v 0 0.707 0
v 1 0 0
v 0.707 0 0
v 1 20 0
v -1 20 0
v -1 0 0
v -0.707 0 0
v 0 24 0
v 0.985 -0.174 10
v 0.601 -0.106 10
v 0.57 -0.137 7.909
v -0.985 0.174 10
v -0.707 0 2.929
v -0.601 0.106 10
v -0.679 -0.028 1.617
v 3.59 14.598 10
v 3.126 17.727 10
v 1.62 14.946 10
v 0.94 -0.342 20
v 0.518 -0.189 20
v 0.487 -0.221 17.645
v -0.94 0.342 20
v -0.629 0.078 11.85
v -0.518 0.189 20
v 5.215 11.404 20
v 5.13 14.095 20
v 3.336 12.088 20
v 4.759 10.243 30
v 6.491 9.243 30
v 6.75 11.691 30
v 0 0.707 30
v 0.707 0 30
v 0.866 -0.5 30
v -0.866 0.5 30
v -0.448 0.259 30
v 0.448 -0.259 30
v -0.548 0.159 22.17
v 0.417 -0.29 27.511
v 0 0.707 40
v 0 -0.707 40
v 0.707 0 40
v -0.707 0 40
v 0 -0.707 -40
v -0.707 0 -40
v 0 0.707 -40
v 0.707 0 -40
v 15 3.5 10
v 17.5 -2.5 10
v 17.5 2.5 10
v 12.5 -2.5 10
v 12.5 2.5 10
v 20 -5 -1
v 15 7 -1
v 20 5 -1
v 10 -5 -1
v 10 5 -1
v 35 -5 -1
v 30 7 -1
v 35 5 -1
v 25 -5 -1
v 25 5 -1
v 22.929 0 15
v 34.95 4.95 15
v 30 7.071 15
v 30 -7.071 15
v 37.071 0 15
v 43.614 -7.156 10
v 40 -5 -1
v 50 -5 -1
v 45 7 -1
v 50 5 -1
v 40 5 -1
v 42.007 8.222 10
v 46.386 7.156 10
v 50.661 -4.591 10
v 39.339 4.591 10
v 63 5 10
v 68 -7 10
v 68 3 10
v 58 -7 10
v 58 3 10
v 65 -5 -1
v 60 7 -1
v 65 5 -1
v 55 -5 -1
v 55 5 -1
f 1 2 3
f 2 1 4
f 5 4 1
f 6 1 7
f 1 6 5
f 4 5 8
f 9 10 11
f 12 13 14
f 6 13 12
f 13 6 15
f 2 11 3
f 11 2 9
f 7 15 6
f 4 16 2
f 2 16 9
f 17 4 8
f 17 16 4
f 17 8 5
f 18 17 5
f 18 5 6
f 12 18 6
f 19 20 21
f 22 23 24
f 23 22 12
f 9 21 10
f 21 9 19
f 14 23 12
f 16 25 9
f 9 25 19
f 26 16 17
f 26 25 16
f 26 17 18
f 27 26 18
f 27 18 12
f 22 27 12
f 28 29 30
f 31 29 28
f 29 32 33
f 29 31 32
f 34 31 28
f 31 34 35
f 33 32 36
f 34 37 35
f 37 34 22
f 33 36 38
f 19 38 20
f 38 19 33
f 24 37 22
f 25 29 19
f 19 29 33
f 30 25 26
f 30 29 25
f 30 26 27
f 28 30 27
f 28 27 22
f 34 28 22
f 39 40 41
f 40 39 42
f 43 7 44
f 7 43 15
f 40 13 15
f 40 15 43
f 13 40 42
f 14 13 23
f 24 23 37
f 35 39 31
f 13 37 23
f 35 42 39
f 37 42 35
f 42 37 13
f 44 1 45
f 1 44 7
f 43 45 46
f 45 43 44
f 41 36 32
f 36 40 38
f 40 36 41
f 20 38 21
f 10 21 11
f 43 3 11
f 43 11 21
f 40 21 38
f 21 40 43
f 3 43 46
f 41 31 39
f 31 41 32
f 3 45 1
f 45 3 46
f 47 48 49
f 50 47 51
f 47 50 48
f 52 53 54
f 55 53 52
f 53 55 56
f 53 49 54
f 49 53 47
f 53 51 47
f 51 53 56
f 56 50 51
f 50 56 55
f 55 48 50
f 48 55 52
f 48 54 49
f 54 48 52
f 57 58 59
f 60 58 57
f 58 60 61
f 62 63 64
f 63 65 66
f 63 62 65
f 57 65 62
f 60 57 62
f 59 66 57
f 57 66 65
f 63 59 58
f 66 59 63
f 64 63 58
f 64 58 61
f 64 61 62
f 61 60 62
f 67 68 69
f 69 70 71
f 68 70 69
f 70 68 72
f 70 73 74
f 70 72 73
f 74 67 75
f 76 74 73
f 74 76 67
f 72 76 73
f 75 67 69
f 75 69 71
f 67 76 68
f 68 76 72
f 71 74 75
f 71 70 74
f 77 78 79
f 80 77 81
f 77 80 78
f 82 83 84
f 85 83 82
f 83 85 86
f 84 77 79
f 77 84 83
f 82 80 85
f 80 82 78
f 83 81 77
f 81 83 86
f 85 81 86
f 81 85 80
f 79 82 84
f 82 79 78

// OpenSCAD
//# Copyright (C) 2017 Robert Marchese
//
// An alternative to the standard linear extrusion operation.
//
// A list of 2D coordinates is transformed by the given parametes 
// and moved to the z=h plane. The original and transformed set of 
// points are used to generate a polyhedron.
//
// This program is available under the Creative Commons 
// Attribution-ShareAlike License; additional terms may apply. 
// 
// References:
// https://en.wikipedia.org/wiki/Transformation_matrix#Affine_transformations
// https://en.wikibooks.org/wiki/OpenSCAD_User_Manual/Primitive_Solids#polyhedron
//

// Examples
// Test points form a little house shape centered on [0,0]
points = [[-5,-5],[5,-5],[5,5],[0,7],[-5,5]];


//translate([-15,0,0]) polygon(points);

// height 10, no other transforms
//alt_extrude(points, 10);
stretch (
    points,
    transform_matrix(0, 0, [.2,2],[0,5]),
    transform_matrix(10, -10, [.2,1.5], [0,5]));
stretch (
    points,
    transform_matrix(10, -10, [.2,1.5], [0,5]),
    transform_matrix(20, -20, [.2,1.25], [0,5]));
stretch (
    points,
    transform_matrix(20, -20, [.2,1.25], [0,5]),
    transform_matrix(30, -30, [.2,1.125], [0,5]));
rotate([0,0,45]) translate([0,-0,0]) cube([1,1,80], center=true);

// height 10, top surface scaled to half size
translate([15,0,0]) alt_extrude(points, 10, 0, [.5,.5]);

// height 15, rotated 45 deg counter clockwise
translate([30,0,0]) alt_extrude(points, 15, -45, [1, 1]);

// height 10, rotated 20 deg and scaled 75% in X, 125% in Y
translate([45,0,0]) alt_extrude(points, 10, 20, [.75,1.25]);

// height 10, skewed left x=3 and down 2
translate([60,0,0]) alt_extrude(points, 10, 0, [1,1], [3,-2]);
// Examples
//

// Dot product of two vectors of length 3.
function dot(a, b) = a[0]*b[0]+a[1]*b[1]+a[2]*b[2];

// Generates a transfrom matrix from the given paramers
// h - the Z-axis value the polygon is moved to
// a - rotation angle
// s - scale factors, a vector [Sx, Sy]
// t - translation value, a vector [Tx, amd Ty]
// Returns a 3x3 matrix for the Rotation, Scale and 
// Translation (in that order)
/*
function transform_matrix(h=0, a=0, s=[1,1], t=[0,0]) = 
    [[s[0]*cos(a), -s[1]*sin(a), t[0]],
     [s[0]*sin(a),  s[1]*cos(a), t[1]],
     [          0,            0, h]];
*/
function transform_matrix(h=0, a=0, s=[1,1], t=[0,0]) =
    [[s[0]*cos(a), -s[1]*sin(a), t[0]*s[0]*cos(a)-t[1]*s[1]*sin(a)],
     [s[0]*sin(a),  s[1]*cos(a), t[0]*s[0]*sin(a)+t[1]*s[1]*cos(a)],
     [          0,            0, h]];

// Stiches together two sets of 2D polygon points seperated to for a 
// polyhedron. The two sets of points are generated by extending the
// original set into 3D (by adding a 3D coordinate, Z=1) and then
// transforming them with the two matricies, m0 and m1. 
module stretch(p2d, m0, m1) {
    n = len(p2d);

    p = [ for(i=[0:n-1]) [p2d[i][0], p2d[i][1], 1] ];

    p0 = [for(i=[0:n-1]) [dot(p[i],m0[0]), dot(p[i],m0[1]), dot(p[i],m0[2])] ];
    p1 = [for(i=[0:n-1]) [dot(p[i],m1[0]), dot(p[i],m1[1]), dot(p[i],m1[2])] ];

    bottom = [[for(i=[0:n-1]) i]];
    top    = [[for(i=[2*n-1:-1:n]) i%(2*n)]];
    sides  = [ for (i=[0:n-1]) [(0+i)%n+n,(1+i)%n+n,(1+i)%n,(0+i)%n]];
    all_faces = concat(bottom, top, sides);

    polyhedron(concat(p0, p1), all_faces);
}


// Form a polygon from the points p. The bottom surfaces is
// and n-gon defined by p while the top surface is generated
// from these by applying transforms given in the parameters
// 
//  p - The set of points forming the base of the polyhedron
//  h - The height of the polyhedron
//  ang-Rotation of the top surface around [0,0]
//  s - A vector length 2 defining the scale factors for x and Y
//  t - A vector defining the translation distance. Note, this
//      transform is applied after all of the others.
//
module alt_extrude(p, h=1, ang=0, s=[1,1], t=[0,0]) {
    translate([0,0,-1]) stretch (
        p,
        transform_matrix(),
        transform_matrix(h+1, ang, s, t));
/*
    n = len(p);

    // Generate the transform matrix for top surface. Could be
    // 2x2, but the last column defines a skew tanslation. 
    M =[[s[0]*cos(ang), -s[1]*sin(ang), t[0]],
        [s[0]*sin(ang),  s[1]*cos(ang), t[1]],
        [            0,              0, 1]];

    // Extend coords for bottom to 3D, using z=1 (see Affine
    // Transforms reference above)
    p0 = [ for(i=[0:n-1]) [p[i][0], p[i][1], 1] ];

    // Apply transform matrix to x and y values of p0. Z value is
    // overwritten since it would be ignored for this 2D transform
    // and it is convenient to do it here.
    p1 = [for(i=[0:n-1]) [dot(p0[i],M[0]), dot(p0[i],M[1]), h+1] ];

    // Each faces is defined by a list of vertcies taken from
    // p0 and p1. The top and bottoms are all the p0 and p1
    // taken in clockwise order when looking at the final polyhedron
    // from outside. The others are two points from p0 and the 
    // corresponding 2 from p1.
    bottom = [[for(i=[0:n-1]) i]];
    top   = [[for(i=[2*n-1:-1:n]) i%(2*n)]];
    sides = [ for (i=[0:n-1]) [(0+i)%n+n,(1+i)%n+n,(1+i)%n,(0+i)%n]];
    all_faces = concat(bottom, top, sides);

    // Generate the polyhedron and translate down 1 unit to compensate
    // for offset used to expand 2D points into 3D
    translate([0,0,-1]) polyhedron(concat(p0, p1), all_faces);
*/
}
